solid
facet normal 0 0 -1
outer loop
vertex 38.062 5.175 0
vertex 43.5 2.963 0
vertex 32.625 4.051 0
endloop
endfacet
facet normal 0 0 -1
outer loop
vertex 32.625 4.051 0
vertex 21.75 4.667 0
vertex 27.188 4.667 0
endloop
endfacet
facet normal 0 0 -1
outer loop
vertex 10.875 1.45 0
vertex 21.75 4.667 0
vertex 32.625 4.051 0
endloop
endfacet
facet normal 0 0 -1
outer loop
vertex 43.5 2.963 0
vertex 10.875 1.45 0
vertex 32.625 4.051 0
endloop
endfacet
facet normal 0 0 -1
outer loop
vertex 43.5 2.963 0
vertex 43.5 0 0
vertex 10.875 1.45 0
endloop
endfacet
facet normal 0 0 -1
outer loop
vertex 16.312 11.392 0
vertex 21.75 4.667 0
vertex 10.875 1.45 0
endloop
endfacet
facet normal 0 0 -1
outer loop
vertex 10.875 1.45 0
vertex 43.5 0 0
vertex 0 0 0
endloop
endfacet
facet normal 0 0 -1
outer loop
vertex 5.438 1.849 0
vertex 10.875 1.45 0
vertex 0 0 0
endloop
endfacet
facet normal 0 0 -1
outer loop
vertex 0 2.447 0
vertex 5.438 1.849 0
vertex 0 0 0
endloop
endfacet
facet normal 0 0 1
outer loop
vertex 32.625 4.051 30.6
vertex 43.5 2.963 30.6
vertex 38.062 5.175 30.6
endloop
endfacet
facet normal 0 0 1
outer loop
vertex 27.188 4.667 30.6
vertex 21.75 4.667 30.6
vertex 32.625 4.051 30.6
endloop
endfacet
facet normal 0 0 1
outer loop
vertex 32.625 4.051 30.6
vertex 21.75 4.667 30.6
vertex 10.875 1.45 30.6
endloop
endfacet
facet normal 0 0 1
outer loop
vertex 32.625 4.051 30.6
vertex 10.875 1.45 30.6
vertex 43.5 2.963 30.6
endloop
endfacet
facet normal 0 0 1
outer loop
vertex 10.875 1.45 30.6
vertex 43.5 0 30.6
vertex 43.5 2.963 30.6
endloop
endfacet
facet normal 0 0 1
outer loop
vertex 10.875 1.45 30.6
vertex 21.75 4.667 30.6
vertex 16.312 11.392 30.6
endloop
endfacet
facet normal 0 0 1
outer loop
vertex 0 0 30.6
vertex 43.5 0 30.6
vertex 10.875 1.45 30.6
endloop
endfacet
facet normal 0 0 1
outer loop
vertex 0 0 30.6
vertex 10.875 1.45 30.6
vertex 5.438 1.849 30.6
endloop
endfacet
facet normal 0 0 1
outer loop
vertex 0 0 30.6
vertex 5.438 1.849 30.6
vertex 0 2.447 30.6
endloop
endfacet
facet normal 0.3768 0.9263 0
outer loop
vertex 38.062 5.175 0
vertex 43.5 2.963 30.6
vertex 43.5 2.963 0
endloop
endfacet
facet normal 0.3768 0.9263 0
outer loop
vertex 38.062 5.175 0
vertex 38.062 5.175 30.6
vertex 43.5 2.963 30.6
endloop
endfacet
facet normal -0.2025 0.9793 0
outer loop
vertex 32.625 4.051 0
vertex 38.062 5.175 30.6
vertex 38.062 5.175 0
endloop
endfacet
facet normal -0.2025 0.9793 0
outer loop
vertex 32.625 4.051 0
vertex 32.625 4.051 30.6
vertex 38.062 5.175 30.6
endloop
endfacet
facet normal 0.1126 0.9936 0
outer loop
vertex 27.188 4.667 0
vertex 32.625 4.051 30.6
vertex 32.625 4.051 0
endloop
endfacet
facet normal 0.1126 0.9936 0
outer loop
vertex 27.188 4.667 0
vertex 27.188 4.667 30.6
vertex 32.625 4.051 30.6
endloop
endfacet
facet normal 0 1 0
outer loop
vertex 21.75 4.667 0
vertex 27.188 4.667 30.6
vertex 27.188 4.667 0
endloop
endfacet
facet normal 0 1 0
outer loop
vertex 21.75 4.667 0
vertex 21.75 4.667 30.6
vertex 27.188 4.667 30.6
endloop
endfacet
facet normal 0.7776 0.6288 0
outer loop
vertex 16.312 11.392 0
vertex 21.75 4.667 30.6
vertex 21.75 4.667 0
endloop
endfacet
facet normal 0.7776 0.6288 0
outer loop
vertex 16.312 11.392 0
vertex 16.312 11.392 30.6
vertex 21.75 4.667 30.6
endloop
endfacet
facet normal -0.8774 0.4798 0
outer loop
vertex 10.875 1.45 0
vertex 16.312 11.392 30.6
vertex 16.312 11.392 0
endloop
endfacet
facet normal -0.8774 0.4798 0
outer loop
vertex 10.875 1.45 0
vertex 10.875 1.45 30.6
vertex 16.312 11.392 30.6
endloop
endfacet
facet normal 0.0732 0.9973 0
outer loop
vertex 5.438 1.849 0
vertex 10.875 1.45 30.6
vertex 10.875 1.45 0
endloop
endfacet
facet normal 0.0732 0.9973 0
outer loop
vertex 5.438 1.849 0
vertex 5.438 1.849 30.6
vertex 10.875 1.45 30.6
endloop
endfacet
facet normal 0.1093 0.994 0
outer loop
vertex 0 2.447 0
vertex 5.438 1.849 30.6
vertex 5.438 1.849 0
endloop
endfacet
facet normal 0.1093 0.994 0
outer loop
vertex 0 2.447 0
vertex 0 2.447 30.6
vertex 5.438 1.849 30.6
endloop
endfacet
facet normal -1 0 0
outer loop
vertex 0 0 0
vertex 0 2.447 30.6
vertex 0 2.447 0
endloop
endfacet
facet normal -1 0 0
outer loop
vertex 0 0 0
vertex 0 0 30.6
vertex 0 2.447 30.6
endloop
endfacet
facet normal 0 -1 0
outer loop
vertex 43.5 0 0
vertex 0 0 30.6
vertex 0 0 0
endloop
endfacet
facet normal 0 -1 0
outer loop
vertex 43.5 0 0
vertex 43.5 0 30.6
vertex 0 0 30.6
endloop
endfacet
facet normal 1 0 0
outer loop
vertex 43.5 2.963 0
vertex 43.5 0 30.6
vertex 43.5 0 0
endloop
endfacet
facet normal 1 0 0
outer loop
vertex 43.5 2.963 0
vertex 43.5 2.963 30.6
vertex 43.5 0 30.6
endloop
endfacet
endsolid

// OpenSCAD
/*

Draws a polygon based on 2 days data useage from Matts current cost feed

curl 'https://user:pass@api.xively.com/v2/feeds/130883.csv?start=2015-03-28T00:00:00&duration=24hours&interval_type=discrete&interval=10800'

Text then stripped down to coordinates

You'll need to change user and pass, obviously.

Polygon printed and snap fits to energy-wristband-cover

*/

// Energy Cover Outer Dimensions; the base for our polygon
x1 = 43.5;
y1 = 30.6;


resize([43.5,0,30.6], auto=[false,true,false]) scale([1,0.005,1]) linear_extrude(height=20) 
polygon([[00,270], [03,204], [06,160], [09,1257], [12,515], [15,515], [18,447], [21,571], [24,327],[24,0],[0,0]] );
